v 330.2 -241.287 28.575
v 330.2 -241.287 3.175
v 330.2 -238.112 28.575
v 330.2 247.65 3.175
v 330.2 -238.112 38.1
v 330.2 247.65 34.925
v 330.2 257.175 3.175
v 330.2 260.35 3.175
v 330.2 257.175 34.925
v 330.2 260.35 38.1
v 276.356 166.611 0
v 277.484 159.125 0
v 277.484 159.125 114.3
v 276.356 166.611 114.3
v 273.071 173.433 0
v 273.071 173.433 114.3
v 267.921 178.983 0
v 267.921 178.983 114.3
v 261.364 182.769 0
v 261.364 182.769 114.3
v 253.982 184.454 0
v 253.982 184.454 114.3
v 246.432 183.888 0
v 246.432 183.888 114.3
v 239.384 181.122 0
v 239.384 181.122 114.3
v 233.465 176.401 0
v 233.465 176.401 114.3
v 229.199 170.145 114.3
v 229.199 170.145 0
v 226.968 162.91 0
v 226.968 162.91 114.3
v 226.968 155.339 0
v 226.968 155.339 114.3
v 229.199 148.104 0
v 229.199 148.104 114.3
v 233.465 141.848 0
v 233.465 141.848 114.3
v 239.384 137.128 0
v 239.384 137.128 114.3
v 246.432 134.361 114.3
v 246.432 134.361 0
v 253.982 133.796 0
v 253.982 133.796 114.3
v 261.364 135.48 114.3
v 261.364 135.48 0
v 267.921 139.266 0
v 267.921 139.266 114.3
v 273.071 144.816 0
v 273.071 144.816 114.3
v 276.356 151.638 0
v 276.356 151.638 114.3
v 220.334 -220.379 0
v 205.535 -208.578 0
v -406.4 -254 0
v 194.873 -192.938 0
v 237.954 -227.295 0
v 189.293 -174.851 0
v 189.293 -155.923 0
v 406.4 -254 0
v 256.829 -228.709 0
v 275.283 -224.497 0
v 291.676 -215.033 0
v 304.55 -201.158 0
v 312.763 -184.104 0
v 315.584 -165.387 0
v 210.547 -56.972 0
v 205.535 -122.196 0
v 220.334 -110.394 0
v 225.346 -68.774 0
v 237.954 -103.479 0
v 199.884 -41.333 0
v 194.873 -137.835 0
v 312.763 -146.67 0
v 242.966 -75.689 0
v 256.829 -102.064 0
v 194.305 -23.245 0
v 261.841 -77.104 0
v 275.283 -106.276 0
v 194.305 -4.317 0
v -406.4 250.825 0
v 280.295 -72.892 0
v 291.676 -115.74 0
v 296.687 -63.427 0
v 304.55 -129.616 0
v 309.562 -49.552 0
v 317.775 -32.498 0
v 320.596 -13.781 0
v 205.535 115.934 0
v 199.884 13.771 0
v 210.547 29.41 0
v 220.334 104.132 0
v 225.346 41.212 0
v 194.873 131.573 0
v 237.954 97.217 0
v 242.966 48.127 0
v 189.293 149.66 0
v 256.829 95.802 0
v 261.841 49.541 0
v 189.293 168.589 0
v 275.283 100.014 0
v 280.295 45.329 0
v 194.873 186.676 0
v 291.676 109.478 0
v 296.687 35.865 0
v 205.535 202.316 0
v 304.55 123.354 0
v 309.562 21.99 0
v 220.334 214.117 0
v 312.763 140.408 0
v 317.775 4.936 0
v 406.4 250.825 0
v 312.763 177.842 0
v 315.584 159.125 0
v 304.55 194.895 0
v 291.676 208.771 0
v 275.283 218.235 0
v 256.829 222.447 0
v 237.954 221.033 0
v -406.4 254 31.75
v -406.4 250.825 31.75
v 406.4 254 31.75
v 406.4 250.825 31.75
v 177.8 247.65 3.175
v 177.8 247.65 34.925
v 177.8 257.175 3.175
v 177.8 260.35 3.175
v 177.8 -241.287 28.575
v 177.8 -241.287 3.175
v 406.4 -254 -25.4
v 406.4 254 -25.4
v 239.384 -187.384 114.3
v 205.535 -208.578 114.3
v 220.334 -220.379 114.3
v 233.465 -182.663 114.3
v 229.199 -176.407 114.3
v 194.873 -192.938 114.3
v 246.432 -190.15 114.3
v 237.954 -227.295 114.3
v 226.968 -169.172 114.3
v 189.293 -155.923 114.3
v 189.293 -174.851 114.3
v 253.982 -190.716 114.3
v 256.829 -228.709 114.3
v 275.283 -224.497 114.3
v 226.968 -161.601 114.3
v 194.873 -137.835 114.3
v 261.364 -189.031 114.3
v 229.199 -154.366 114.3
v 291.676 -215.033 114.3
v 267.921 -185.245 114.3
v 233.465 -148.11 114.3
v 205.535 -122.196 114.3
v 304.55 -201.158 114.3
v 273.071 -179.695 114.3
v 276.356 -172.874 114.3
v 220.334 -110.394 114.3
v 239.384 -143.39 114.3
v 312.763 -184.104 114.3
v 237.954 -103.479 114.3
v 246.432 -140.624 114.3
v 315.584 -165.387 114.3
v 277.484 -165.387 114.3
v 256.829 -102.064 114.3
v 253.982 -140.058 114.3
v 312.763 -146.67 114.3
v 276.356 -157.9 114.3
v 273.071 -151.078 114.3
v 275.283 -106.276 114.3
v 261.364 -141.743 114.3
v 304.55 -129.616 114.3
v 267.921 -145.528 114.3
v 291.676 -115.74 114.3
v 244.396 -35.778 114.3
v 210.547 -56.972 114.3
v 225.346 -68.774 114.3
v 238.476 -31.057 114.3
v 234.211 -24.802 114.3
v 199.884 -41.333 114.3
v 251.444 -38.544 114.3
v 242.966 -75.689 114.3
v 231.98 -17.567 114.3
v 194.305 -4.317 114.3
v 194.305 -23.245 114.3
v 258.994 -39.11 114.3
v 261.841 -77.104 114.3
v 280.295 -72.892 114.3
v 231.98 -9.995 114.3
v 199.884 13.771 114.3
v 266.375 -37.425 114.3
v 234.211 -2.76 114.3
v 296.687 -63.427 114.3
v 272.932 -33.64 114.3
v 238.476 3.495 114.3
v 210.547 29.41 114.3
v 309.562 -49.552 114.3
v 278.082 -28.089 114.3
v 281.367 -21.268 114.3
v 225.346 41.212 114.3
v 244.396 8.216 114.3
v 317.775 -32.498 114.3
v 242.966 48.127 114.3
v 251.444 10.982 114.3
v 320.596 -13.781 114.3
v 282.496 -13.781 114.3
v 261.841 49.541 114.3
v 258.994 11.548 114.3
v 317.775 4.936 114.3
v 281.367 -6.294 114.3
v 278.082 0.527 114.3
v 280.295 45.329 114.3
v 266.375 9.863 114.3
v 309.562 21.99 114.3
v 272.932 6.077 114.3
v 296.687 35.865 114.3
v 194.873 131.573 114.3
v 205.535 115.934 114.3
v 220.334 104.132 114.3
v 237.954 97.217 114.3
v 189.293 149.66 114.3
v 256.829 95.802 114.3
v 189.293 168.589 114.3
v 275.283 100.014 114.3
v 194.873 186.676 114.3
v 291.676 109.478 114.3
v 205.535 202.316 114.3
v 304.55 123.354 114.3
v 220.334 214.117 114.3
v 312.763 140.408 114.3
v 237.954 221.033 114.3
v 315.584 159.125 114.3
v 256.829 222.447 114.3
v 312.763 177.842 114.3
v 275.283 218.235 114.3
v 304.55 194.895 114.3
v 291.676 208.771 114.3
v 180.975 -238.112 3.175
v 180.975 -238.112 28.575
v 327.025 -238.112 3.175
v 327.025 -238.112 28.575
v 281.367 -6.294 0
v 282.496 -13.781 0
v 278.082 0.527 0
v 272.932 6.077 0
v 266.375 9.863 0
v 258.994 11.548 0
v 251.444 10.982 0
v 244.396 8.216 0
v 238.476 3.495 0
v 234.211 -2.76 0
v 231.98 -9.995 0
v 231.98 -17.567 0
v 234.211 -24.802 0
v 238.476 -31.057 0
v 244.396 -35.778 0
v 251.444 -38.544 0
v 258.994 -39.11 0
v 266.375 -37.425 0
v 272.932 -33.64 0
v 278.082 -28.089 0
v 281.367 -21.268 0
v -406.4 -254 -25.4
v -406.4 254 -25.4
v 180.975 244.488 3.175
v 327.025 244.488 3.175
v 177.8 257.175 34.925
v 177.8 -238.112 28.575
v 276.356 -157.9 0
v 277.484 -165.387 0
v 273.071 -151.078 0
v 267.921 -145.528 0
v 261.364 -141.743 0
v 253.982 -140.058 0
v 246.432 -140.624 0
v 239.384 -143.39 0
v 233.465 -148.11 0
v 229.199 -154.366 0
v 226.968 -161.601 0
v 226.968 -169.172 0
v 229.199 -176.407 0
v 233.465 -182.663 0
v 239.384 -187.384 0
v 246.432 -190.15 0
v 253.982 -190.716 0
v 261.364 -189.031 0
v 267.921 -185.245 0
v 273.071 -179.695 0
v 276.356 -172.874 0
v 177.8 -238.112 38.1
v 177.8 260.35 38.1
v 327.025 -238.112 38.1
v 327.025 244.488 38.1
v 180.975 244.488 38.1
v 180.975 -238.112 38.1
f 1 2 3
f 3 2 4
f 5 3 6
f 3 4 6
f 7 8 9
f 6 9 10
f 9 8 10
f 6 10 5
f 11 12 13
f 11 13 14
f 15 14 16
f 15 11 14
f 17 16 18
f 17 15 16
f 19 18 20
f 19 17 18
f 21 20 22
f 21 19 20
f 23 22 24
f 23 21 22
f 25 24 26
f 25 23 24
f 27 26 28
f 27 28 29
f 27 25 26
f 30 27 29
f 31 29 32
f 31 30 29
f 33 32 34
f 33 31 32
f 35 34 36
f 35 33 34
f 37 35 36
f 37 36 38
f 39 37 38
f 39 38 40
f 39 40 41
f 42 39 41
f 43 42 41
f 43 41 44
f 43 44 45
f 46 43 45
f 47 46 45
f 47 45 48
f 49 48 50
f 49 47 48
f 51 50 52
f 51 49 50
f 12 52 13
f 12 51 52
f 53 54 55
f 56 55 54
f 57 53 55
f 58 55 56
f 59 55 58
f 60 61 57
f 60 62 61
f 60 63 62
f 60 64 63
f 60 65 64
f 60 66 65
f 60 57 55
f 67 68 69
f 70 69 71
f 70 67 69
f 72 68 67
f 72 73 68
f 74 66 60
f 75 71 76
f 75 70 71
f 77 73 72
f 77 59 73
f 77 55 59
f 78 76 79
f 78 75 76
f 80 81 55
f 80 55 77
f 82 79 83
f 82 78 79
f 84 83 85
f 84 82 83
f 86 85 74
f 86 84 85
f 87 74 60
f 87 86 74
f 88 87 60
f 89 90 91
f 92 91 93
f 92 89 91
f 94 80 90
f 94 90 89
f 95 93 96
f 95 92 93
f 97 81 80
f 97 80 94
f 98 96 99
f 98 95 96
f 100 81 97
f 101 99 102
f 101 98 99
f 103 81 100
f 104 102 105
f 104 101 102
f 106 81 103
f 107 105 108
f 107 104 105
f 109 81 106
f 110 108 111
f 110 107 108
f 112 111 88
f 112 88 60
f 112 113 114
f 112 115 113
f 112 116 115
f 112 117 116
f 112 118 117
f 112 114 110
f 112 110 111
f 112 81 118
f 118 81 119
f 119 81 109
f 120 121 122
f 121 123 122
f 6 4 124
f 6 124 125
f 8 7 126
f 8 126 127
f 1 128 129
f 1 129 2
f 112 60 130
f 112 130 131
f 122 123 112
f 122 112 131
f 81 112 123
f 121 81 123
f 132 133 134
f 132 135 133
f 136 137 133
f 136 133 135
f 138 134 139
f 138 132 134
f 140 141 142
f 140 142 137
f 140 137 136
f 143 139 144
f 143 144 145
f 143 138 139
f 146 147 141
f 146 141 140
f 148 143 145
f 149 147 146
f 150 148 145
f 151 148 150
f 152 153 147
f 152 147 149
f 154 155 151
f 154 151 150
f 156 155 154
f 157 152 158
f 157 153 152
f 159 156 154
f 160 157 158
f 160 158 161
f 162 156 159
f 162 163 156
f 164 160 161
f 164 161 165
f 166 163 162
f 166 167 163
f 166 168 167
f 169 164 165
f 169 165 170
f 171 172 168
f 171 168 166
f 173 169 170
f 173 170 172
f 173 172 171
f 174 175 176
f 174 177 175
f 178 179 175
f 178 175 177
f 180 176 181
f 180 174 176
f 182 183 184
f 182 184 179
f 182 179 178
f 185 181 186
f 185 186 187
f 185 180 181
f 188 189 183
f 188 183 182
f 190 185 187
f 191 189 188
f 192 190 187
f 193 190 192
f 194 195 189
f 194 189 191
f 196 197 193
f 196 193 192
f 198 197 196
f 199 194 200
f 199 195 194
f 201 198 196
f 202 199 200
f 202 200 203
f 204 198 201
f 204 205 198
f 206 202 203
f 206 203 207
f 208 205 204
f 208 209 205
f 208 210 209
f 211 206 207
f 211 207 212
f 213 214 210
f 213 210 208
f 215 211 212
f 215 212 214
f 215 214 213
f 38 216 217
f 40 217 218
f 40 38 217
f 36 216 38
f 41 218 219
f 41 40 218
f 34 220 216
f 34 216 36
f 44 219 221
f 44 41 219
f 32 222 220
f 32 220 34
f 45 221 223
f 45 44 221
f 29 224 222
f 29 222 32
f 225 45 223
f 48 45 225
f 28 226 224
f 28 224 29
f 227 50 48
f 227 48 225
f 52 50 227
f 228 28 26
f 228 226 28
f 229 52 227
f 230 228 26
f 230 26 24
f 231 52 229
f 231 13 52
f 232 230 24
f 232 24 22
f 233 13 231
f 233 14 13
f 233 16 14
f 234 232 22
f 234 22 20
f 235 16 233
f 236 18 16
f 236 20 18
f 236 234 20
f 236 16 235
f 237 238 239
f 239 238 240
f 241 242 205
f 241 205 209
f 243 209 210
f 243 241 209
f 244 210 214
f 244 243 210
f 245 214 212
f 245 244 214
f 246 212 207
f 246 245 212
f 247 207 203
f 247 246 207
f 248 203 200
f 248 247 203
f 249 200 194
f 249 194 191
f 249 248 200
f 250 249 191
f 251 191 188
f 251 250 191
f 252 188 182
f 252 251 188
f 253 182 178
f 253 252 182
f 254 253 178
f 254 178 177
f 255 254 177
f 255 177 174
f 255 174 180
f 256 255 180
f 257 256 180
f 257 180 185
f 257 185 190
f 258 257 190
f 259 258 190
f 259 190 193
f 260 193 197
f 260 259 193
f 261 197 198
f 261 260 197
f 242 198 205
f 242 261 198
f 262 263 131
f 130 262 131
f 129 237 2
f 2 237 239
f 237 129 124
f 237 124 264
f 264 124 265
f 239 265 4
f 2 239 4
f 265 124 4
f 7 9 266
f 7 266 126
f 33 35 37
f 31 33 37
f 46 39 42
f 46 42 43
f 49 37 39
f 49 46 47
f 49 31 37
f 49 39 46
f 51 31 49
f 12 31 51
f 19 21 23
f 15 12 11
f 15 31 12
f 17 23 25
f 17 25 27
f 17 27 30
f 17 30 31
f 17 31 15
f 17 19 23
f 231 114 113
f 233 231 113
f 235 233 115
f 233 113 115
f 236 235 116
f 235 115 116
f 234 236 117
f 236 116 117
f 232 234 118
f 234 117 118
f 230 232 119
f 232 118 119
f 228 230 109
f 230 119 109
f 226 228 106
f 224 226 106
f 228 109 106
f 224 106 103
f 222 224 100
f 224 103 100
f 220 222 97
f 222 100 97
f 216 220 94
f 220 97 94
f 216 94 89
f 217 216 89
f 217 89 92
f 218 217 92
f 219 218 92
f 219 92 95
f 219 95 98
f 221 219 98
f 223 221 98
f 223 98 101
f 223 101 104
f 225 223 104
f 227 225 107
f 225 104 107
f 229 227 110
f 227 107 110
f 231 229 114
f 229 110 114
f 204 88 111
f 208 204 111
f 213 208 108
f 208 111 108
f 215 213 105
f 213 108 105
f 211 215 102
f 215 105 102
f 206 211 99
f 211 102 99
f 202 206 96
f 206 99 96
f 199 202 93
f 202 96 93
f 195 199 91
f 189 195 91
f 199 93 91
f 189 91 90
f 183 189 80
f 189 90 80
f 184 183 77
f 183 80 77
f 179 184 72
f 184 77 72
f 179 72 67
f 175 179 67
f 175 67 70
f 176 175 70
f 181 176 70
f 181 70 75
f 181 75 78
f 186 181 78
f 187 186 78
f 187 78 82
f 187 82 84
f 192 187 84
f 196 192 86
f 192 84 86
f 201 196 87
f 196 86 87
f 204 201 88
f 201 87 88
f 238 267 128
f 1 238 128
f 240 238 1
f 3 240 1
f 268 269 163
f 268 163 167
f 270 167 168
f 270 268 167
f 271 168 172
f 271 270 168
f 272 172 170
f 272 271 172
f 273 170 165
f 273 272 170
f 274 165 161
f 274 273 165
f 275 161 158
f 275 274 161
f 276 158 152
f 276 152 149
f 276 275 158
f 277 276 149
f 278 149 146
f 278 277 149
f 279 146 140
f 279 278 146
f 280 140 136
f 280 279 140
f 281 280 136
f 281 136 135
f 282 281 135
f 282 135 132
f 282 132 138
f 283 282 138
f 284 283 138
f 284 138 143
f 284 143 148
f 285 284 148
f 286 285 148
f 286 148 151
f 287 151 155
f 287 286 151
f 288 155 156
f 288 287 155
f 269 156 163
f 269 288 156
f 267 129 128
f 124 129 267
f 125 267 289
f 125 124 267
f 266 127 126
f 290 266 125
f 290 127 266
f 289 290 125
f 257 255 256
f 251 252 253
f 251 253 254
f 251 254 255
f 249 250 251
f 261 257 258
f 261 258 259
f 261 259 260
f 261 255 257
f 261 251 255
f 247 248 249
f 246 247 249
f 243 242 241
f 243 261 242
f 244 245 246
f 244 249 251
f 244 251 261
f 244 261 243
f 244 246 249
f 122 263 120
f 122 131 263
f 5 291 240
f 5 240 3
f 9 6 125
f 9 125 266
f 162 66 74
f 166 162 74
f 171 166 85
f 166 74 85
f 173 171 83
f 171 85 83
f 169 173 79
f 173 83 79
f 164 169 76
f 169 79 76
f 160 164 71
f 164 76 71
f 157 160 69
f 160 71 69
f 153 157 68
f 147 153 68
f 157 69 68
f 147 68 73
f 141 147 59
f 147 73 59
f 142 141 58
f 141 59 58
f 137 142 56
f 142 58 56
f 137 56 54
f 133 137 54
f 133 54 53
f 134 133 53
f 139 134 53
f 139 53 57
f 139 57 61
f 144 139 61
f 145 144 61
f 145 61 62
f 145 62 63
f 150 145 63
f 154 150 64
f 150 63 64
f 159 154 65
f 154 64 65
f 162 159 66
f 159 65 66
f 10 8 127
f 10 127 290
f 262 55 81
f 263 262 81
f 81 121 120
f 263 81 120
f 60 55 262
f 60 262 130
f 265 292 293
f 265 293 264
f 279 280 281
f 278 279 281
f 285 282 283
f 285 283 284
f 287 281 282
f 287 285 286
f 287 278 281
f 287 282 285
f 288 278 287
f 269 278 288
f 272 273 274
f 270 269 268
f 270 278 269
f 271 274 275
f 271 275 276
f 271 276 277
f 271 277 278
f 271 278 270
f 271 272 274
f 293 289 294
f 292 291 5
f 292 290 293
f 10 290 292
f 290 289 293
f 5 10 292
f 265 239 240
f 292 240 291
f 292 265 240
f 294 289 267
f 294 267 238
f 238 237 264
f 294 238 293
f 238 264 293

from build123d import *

# Parameters (mm, degrees)
F0_W      = 812.8
F0_H      = 508
F1_DEPTH  = 25.4
F2_W      = 3.175
F2_H      = 31.75
F3_DEPTH  = 406.4
F6_DEPTH  = 76.2
F7_W      = 3.175
F7_H      = 34.925
F8_DEPTH  = 482.6
F9_W      = 152.4
F9_H      = 25.4
F10_DEPTH = 3.175
F11_R     = 63.5
F11_R_2   = 25.4
F12_DEPTH = 114.3


with BuildPart() as f1:
    # F0 (on Top) → F1 (new body)
    with BuildSketch(Plane.XY):
        Rectangle(F0_W, F0_H)
    extrude(amount=-F1_DEPTH)

    # F2 (on Right) → F3 (join, symmetric)
    with BuildSketch(Plane.YZ):
        with Locations((252.4125, 15.875)):
            Rectangle(F2_W, F2_H)
    extrude(amount=F3_DEPTH, both=True)

    # F11 (on face) → F12 (join)
    with BuildSketch(Plane.XY):
        with Locations((252.084047, 159.124628)):
            Circle(F11_R)
        with Locations((252.084047, 159.124628)):
            Circle(F11_R_2, mode=Mode.SUBTRACT)
        with Locations((257.095814, -13.781065)):
            Circle(F11_R)
        with Locations((257.095814, -13.781065)):
            Circle(F11_R_2, mode=Mode.SUBTRACT)
        with Locations((252.084047, -165.386781)):
            Circle(F11_R)
        with Locations((252.084047, -165.386781)):
            Circle(F11_R_2, mode=Mode.SUBTRACT)
    extrude(amount=F12_DEPTH)


with BuildPart() as f6:
    # F5 (on offset) → F6 (new body, symmetric)
    with BuildSketch(Plane.YZ.offset(254)):
        Polygon((244.487631, 3.175), (247.65, 3.175), (247.65, 34.925), (257.175, 34.925), (257.175, 3.175), (260.35, 3.175), (260.35, 38.1), (244.487631, 38.1), align=None)
    extrude(amount=F6_DEPTH, both=True)

    # F7 (on face) → F8 (join)
    with BuildSketch(Plane.XZ.offset(-244.487631)):
        with Locations((179.3875, 20.6375)):
            Rectangle(F7_W, F7_H)
        with Locations((328.6125, 20.6375)):
            Rectangle(F7_W, F7_H)
    extrude(amount=F8_DEPTH)

    # F9 (on face) → F10 (join)
    with BuildSketch(Plane.XZ.offset(238.112369)):
        with Locations((254, 15.875)):
            Rectangle(F9_W, F9_H)
    extrude(amount=F10_DEPTH)


solid = Compound([f1.part, f6.part])
